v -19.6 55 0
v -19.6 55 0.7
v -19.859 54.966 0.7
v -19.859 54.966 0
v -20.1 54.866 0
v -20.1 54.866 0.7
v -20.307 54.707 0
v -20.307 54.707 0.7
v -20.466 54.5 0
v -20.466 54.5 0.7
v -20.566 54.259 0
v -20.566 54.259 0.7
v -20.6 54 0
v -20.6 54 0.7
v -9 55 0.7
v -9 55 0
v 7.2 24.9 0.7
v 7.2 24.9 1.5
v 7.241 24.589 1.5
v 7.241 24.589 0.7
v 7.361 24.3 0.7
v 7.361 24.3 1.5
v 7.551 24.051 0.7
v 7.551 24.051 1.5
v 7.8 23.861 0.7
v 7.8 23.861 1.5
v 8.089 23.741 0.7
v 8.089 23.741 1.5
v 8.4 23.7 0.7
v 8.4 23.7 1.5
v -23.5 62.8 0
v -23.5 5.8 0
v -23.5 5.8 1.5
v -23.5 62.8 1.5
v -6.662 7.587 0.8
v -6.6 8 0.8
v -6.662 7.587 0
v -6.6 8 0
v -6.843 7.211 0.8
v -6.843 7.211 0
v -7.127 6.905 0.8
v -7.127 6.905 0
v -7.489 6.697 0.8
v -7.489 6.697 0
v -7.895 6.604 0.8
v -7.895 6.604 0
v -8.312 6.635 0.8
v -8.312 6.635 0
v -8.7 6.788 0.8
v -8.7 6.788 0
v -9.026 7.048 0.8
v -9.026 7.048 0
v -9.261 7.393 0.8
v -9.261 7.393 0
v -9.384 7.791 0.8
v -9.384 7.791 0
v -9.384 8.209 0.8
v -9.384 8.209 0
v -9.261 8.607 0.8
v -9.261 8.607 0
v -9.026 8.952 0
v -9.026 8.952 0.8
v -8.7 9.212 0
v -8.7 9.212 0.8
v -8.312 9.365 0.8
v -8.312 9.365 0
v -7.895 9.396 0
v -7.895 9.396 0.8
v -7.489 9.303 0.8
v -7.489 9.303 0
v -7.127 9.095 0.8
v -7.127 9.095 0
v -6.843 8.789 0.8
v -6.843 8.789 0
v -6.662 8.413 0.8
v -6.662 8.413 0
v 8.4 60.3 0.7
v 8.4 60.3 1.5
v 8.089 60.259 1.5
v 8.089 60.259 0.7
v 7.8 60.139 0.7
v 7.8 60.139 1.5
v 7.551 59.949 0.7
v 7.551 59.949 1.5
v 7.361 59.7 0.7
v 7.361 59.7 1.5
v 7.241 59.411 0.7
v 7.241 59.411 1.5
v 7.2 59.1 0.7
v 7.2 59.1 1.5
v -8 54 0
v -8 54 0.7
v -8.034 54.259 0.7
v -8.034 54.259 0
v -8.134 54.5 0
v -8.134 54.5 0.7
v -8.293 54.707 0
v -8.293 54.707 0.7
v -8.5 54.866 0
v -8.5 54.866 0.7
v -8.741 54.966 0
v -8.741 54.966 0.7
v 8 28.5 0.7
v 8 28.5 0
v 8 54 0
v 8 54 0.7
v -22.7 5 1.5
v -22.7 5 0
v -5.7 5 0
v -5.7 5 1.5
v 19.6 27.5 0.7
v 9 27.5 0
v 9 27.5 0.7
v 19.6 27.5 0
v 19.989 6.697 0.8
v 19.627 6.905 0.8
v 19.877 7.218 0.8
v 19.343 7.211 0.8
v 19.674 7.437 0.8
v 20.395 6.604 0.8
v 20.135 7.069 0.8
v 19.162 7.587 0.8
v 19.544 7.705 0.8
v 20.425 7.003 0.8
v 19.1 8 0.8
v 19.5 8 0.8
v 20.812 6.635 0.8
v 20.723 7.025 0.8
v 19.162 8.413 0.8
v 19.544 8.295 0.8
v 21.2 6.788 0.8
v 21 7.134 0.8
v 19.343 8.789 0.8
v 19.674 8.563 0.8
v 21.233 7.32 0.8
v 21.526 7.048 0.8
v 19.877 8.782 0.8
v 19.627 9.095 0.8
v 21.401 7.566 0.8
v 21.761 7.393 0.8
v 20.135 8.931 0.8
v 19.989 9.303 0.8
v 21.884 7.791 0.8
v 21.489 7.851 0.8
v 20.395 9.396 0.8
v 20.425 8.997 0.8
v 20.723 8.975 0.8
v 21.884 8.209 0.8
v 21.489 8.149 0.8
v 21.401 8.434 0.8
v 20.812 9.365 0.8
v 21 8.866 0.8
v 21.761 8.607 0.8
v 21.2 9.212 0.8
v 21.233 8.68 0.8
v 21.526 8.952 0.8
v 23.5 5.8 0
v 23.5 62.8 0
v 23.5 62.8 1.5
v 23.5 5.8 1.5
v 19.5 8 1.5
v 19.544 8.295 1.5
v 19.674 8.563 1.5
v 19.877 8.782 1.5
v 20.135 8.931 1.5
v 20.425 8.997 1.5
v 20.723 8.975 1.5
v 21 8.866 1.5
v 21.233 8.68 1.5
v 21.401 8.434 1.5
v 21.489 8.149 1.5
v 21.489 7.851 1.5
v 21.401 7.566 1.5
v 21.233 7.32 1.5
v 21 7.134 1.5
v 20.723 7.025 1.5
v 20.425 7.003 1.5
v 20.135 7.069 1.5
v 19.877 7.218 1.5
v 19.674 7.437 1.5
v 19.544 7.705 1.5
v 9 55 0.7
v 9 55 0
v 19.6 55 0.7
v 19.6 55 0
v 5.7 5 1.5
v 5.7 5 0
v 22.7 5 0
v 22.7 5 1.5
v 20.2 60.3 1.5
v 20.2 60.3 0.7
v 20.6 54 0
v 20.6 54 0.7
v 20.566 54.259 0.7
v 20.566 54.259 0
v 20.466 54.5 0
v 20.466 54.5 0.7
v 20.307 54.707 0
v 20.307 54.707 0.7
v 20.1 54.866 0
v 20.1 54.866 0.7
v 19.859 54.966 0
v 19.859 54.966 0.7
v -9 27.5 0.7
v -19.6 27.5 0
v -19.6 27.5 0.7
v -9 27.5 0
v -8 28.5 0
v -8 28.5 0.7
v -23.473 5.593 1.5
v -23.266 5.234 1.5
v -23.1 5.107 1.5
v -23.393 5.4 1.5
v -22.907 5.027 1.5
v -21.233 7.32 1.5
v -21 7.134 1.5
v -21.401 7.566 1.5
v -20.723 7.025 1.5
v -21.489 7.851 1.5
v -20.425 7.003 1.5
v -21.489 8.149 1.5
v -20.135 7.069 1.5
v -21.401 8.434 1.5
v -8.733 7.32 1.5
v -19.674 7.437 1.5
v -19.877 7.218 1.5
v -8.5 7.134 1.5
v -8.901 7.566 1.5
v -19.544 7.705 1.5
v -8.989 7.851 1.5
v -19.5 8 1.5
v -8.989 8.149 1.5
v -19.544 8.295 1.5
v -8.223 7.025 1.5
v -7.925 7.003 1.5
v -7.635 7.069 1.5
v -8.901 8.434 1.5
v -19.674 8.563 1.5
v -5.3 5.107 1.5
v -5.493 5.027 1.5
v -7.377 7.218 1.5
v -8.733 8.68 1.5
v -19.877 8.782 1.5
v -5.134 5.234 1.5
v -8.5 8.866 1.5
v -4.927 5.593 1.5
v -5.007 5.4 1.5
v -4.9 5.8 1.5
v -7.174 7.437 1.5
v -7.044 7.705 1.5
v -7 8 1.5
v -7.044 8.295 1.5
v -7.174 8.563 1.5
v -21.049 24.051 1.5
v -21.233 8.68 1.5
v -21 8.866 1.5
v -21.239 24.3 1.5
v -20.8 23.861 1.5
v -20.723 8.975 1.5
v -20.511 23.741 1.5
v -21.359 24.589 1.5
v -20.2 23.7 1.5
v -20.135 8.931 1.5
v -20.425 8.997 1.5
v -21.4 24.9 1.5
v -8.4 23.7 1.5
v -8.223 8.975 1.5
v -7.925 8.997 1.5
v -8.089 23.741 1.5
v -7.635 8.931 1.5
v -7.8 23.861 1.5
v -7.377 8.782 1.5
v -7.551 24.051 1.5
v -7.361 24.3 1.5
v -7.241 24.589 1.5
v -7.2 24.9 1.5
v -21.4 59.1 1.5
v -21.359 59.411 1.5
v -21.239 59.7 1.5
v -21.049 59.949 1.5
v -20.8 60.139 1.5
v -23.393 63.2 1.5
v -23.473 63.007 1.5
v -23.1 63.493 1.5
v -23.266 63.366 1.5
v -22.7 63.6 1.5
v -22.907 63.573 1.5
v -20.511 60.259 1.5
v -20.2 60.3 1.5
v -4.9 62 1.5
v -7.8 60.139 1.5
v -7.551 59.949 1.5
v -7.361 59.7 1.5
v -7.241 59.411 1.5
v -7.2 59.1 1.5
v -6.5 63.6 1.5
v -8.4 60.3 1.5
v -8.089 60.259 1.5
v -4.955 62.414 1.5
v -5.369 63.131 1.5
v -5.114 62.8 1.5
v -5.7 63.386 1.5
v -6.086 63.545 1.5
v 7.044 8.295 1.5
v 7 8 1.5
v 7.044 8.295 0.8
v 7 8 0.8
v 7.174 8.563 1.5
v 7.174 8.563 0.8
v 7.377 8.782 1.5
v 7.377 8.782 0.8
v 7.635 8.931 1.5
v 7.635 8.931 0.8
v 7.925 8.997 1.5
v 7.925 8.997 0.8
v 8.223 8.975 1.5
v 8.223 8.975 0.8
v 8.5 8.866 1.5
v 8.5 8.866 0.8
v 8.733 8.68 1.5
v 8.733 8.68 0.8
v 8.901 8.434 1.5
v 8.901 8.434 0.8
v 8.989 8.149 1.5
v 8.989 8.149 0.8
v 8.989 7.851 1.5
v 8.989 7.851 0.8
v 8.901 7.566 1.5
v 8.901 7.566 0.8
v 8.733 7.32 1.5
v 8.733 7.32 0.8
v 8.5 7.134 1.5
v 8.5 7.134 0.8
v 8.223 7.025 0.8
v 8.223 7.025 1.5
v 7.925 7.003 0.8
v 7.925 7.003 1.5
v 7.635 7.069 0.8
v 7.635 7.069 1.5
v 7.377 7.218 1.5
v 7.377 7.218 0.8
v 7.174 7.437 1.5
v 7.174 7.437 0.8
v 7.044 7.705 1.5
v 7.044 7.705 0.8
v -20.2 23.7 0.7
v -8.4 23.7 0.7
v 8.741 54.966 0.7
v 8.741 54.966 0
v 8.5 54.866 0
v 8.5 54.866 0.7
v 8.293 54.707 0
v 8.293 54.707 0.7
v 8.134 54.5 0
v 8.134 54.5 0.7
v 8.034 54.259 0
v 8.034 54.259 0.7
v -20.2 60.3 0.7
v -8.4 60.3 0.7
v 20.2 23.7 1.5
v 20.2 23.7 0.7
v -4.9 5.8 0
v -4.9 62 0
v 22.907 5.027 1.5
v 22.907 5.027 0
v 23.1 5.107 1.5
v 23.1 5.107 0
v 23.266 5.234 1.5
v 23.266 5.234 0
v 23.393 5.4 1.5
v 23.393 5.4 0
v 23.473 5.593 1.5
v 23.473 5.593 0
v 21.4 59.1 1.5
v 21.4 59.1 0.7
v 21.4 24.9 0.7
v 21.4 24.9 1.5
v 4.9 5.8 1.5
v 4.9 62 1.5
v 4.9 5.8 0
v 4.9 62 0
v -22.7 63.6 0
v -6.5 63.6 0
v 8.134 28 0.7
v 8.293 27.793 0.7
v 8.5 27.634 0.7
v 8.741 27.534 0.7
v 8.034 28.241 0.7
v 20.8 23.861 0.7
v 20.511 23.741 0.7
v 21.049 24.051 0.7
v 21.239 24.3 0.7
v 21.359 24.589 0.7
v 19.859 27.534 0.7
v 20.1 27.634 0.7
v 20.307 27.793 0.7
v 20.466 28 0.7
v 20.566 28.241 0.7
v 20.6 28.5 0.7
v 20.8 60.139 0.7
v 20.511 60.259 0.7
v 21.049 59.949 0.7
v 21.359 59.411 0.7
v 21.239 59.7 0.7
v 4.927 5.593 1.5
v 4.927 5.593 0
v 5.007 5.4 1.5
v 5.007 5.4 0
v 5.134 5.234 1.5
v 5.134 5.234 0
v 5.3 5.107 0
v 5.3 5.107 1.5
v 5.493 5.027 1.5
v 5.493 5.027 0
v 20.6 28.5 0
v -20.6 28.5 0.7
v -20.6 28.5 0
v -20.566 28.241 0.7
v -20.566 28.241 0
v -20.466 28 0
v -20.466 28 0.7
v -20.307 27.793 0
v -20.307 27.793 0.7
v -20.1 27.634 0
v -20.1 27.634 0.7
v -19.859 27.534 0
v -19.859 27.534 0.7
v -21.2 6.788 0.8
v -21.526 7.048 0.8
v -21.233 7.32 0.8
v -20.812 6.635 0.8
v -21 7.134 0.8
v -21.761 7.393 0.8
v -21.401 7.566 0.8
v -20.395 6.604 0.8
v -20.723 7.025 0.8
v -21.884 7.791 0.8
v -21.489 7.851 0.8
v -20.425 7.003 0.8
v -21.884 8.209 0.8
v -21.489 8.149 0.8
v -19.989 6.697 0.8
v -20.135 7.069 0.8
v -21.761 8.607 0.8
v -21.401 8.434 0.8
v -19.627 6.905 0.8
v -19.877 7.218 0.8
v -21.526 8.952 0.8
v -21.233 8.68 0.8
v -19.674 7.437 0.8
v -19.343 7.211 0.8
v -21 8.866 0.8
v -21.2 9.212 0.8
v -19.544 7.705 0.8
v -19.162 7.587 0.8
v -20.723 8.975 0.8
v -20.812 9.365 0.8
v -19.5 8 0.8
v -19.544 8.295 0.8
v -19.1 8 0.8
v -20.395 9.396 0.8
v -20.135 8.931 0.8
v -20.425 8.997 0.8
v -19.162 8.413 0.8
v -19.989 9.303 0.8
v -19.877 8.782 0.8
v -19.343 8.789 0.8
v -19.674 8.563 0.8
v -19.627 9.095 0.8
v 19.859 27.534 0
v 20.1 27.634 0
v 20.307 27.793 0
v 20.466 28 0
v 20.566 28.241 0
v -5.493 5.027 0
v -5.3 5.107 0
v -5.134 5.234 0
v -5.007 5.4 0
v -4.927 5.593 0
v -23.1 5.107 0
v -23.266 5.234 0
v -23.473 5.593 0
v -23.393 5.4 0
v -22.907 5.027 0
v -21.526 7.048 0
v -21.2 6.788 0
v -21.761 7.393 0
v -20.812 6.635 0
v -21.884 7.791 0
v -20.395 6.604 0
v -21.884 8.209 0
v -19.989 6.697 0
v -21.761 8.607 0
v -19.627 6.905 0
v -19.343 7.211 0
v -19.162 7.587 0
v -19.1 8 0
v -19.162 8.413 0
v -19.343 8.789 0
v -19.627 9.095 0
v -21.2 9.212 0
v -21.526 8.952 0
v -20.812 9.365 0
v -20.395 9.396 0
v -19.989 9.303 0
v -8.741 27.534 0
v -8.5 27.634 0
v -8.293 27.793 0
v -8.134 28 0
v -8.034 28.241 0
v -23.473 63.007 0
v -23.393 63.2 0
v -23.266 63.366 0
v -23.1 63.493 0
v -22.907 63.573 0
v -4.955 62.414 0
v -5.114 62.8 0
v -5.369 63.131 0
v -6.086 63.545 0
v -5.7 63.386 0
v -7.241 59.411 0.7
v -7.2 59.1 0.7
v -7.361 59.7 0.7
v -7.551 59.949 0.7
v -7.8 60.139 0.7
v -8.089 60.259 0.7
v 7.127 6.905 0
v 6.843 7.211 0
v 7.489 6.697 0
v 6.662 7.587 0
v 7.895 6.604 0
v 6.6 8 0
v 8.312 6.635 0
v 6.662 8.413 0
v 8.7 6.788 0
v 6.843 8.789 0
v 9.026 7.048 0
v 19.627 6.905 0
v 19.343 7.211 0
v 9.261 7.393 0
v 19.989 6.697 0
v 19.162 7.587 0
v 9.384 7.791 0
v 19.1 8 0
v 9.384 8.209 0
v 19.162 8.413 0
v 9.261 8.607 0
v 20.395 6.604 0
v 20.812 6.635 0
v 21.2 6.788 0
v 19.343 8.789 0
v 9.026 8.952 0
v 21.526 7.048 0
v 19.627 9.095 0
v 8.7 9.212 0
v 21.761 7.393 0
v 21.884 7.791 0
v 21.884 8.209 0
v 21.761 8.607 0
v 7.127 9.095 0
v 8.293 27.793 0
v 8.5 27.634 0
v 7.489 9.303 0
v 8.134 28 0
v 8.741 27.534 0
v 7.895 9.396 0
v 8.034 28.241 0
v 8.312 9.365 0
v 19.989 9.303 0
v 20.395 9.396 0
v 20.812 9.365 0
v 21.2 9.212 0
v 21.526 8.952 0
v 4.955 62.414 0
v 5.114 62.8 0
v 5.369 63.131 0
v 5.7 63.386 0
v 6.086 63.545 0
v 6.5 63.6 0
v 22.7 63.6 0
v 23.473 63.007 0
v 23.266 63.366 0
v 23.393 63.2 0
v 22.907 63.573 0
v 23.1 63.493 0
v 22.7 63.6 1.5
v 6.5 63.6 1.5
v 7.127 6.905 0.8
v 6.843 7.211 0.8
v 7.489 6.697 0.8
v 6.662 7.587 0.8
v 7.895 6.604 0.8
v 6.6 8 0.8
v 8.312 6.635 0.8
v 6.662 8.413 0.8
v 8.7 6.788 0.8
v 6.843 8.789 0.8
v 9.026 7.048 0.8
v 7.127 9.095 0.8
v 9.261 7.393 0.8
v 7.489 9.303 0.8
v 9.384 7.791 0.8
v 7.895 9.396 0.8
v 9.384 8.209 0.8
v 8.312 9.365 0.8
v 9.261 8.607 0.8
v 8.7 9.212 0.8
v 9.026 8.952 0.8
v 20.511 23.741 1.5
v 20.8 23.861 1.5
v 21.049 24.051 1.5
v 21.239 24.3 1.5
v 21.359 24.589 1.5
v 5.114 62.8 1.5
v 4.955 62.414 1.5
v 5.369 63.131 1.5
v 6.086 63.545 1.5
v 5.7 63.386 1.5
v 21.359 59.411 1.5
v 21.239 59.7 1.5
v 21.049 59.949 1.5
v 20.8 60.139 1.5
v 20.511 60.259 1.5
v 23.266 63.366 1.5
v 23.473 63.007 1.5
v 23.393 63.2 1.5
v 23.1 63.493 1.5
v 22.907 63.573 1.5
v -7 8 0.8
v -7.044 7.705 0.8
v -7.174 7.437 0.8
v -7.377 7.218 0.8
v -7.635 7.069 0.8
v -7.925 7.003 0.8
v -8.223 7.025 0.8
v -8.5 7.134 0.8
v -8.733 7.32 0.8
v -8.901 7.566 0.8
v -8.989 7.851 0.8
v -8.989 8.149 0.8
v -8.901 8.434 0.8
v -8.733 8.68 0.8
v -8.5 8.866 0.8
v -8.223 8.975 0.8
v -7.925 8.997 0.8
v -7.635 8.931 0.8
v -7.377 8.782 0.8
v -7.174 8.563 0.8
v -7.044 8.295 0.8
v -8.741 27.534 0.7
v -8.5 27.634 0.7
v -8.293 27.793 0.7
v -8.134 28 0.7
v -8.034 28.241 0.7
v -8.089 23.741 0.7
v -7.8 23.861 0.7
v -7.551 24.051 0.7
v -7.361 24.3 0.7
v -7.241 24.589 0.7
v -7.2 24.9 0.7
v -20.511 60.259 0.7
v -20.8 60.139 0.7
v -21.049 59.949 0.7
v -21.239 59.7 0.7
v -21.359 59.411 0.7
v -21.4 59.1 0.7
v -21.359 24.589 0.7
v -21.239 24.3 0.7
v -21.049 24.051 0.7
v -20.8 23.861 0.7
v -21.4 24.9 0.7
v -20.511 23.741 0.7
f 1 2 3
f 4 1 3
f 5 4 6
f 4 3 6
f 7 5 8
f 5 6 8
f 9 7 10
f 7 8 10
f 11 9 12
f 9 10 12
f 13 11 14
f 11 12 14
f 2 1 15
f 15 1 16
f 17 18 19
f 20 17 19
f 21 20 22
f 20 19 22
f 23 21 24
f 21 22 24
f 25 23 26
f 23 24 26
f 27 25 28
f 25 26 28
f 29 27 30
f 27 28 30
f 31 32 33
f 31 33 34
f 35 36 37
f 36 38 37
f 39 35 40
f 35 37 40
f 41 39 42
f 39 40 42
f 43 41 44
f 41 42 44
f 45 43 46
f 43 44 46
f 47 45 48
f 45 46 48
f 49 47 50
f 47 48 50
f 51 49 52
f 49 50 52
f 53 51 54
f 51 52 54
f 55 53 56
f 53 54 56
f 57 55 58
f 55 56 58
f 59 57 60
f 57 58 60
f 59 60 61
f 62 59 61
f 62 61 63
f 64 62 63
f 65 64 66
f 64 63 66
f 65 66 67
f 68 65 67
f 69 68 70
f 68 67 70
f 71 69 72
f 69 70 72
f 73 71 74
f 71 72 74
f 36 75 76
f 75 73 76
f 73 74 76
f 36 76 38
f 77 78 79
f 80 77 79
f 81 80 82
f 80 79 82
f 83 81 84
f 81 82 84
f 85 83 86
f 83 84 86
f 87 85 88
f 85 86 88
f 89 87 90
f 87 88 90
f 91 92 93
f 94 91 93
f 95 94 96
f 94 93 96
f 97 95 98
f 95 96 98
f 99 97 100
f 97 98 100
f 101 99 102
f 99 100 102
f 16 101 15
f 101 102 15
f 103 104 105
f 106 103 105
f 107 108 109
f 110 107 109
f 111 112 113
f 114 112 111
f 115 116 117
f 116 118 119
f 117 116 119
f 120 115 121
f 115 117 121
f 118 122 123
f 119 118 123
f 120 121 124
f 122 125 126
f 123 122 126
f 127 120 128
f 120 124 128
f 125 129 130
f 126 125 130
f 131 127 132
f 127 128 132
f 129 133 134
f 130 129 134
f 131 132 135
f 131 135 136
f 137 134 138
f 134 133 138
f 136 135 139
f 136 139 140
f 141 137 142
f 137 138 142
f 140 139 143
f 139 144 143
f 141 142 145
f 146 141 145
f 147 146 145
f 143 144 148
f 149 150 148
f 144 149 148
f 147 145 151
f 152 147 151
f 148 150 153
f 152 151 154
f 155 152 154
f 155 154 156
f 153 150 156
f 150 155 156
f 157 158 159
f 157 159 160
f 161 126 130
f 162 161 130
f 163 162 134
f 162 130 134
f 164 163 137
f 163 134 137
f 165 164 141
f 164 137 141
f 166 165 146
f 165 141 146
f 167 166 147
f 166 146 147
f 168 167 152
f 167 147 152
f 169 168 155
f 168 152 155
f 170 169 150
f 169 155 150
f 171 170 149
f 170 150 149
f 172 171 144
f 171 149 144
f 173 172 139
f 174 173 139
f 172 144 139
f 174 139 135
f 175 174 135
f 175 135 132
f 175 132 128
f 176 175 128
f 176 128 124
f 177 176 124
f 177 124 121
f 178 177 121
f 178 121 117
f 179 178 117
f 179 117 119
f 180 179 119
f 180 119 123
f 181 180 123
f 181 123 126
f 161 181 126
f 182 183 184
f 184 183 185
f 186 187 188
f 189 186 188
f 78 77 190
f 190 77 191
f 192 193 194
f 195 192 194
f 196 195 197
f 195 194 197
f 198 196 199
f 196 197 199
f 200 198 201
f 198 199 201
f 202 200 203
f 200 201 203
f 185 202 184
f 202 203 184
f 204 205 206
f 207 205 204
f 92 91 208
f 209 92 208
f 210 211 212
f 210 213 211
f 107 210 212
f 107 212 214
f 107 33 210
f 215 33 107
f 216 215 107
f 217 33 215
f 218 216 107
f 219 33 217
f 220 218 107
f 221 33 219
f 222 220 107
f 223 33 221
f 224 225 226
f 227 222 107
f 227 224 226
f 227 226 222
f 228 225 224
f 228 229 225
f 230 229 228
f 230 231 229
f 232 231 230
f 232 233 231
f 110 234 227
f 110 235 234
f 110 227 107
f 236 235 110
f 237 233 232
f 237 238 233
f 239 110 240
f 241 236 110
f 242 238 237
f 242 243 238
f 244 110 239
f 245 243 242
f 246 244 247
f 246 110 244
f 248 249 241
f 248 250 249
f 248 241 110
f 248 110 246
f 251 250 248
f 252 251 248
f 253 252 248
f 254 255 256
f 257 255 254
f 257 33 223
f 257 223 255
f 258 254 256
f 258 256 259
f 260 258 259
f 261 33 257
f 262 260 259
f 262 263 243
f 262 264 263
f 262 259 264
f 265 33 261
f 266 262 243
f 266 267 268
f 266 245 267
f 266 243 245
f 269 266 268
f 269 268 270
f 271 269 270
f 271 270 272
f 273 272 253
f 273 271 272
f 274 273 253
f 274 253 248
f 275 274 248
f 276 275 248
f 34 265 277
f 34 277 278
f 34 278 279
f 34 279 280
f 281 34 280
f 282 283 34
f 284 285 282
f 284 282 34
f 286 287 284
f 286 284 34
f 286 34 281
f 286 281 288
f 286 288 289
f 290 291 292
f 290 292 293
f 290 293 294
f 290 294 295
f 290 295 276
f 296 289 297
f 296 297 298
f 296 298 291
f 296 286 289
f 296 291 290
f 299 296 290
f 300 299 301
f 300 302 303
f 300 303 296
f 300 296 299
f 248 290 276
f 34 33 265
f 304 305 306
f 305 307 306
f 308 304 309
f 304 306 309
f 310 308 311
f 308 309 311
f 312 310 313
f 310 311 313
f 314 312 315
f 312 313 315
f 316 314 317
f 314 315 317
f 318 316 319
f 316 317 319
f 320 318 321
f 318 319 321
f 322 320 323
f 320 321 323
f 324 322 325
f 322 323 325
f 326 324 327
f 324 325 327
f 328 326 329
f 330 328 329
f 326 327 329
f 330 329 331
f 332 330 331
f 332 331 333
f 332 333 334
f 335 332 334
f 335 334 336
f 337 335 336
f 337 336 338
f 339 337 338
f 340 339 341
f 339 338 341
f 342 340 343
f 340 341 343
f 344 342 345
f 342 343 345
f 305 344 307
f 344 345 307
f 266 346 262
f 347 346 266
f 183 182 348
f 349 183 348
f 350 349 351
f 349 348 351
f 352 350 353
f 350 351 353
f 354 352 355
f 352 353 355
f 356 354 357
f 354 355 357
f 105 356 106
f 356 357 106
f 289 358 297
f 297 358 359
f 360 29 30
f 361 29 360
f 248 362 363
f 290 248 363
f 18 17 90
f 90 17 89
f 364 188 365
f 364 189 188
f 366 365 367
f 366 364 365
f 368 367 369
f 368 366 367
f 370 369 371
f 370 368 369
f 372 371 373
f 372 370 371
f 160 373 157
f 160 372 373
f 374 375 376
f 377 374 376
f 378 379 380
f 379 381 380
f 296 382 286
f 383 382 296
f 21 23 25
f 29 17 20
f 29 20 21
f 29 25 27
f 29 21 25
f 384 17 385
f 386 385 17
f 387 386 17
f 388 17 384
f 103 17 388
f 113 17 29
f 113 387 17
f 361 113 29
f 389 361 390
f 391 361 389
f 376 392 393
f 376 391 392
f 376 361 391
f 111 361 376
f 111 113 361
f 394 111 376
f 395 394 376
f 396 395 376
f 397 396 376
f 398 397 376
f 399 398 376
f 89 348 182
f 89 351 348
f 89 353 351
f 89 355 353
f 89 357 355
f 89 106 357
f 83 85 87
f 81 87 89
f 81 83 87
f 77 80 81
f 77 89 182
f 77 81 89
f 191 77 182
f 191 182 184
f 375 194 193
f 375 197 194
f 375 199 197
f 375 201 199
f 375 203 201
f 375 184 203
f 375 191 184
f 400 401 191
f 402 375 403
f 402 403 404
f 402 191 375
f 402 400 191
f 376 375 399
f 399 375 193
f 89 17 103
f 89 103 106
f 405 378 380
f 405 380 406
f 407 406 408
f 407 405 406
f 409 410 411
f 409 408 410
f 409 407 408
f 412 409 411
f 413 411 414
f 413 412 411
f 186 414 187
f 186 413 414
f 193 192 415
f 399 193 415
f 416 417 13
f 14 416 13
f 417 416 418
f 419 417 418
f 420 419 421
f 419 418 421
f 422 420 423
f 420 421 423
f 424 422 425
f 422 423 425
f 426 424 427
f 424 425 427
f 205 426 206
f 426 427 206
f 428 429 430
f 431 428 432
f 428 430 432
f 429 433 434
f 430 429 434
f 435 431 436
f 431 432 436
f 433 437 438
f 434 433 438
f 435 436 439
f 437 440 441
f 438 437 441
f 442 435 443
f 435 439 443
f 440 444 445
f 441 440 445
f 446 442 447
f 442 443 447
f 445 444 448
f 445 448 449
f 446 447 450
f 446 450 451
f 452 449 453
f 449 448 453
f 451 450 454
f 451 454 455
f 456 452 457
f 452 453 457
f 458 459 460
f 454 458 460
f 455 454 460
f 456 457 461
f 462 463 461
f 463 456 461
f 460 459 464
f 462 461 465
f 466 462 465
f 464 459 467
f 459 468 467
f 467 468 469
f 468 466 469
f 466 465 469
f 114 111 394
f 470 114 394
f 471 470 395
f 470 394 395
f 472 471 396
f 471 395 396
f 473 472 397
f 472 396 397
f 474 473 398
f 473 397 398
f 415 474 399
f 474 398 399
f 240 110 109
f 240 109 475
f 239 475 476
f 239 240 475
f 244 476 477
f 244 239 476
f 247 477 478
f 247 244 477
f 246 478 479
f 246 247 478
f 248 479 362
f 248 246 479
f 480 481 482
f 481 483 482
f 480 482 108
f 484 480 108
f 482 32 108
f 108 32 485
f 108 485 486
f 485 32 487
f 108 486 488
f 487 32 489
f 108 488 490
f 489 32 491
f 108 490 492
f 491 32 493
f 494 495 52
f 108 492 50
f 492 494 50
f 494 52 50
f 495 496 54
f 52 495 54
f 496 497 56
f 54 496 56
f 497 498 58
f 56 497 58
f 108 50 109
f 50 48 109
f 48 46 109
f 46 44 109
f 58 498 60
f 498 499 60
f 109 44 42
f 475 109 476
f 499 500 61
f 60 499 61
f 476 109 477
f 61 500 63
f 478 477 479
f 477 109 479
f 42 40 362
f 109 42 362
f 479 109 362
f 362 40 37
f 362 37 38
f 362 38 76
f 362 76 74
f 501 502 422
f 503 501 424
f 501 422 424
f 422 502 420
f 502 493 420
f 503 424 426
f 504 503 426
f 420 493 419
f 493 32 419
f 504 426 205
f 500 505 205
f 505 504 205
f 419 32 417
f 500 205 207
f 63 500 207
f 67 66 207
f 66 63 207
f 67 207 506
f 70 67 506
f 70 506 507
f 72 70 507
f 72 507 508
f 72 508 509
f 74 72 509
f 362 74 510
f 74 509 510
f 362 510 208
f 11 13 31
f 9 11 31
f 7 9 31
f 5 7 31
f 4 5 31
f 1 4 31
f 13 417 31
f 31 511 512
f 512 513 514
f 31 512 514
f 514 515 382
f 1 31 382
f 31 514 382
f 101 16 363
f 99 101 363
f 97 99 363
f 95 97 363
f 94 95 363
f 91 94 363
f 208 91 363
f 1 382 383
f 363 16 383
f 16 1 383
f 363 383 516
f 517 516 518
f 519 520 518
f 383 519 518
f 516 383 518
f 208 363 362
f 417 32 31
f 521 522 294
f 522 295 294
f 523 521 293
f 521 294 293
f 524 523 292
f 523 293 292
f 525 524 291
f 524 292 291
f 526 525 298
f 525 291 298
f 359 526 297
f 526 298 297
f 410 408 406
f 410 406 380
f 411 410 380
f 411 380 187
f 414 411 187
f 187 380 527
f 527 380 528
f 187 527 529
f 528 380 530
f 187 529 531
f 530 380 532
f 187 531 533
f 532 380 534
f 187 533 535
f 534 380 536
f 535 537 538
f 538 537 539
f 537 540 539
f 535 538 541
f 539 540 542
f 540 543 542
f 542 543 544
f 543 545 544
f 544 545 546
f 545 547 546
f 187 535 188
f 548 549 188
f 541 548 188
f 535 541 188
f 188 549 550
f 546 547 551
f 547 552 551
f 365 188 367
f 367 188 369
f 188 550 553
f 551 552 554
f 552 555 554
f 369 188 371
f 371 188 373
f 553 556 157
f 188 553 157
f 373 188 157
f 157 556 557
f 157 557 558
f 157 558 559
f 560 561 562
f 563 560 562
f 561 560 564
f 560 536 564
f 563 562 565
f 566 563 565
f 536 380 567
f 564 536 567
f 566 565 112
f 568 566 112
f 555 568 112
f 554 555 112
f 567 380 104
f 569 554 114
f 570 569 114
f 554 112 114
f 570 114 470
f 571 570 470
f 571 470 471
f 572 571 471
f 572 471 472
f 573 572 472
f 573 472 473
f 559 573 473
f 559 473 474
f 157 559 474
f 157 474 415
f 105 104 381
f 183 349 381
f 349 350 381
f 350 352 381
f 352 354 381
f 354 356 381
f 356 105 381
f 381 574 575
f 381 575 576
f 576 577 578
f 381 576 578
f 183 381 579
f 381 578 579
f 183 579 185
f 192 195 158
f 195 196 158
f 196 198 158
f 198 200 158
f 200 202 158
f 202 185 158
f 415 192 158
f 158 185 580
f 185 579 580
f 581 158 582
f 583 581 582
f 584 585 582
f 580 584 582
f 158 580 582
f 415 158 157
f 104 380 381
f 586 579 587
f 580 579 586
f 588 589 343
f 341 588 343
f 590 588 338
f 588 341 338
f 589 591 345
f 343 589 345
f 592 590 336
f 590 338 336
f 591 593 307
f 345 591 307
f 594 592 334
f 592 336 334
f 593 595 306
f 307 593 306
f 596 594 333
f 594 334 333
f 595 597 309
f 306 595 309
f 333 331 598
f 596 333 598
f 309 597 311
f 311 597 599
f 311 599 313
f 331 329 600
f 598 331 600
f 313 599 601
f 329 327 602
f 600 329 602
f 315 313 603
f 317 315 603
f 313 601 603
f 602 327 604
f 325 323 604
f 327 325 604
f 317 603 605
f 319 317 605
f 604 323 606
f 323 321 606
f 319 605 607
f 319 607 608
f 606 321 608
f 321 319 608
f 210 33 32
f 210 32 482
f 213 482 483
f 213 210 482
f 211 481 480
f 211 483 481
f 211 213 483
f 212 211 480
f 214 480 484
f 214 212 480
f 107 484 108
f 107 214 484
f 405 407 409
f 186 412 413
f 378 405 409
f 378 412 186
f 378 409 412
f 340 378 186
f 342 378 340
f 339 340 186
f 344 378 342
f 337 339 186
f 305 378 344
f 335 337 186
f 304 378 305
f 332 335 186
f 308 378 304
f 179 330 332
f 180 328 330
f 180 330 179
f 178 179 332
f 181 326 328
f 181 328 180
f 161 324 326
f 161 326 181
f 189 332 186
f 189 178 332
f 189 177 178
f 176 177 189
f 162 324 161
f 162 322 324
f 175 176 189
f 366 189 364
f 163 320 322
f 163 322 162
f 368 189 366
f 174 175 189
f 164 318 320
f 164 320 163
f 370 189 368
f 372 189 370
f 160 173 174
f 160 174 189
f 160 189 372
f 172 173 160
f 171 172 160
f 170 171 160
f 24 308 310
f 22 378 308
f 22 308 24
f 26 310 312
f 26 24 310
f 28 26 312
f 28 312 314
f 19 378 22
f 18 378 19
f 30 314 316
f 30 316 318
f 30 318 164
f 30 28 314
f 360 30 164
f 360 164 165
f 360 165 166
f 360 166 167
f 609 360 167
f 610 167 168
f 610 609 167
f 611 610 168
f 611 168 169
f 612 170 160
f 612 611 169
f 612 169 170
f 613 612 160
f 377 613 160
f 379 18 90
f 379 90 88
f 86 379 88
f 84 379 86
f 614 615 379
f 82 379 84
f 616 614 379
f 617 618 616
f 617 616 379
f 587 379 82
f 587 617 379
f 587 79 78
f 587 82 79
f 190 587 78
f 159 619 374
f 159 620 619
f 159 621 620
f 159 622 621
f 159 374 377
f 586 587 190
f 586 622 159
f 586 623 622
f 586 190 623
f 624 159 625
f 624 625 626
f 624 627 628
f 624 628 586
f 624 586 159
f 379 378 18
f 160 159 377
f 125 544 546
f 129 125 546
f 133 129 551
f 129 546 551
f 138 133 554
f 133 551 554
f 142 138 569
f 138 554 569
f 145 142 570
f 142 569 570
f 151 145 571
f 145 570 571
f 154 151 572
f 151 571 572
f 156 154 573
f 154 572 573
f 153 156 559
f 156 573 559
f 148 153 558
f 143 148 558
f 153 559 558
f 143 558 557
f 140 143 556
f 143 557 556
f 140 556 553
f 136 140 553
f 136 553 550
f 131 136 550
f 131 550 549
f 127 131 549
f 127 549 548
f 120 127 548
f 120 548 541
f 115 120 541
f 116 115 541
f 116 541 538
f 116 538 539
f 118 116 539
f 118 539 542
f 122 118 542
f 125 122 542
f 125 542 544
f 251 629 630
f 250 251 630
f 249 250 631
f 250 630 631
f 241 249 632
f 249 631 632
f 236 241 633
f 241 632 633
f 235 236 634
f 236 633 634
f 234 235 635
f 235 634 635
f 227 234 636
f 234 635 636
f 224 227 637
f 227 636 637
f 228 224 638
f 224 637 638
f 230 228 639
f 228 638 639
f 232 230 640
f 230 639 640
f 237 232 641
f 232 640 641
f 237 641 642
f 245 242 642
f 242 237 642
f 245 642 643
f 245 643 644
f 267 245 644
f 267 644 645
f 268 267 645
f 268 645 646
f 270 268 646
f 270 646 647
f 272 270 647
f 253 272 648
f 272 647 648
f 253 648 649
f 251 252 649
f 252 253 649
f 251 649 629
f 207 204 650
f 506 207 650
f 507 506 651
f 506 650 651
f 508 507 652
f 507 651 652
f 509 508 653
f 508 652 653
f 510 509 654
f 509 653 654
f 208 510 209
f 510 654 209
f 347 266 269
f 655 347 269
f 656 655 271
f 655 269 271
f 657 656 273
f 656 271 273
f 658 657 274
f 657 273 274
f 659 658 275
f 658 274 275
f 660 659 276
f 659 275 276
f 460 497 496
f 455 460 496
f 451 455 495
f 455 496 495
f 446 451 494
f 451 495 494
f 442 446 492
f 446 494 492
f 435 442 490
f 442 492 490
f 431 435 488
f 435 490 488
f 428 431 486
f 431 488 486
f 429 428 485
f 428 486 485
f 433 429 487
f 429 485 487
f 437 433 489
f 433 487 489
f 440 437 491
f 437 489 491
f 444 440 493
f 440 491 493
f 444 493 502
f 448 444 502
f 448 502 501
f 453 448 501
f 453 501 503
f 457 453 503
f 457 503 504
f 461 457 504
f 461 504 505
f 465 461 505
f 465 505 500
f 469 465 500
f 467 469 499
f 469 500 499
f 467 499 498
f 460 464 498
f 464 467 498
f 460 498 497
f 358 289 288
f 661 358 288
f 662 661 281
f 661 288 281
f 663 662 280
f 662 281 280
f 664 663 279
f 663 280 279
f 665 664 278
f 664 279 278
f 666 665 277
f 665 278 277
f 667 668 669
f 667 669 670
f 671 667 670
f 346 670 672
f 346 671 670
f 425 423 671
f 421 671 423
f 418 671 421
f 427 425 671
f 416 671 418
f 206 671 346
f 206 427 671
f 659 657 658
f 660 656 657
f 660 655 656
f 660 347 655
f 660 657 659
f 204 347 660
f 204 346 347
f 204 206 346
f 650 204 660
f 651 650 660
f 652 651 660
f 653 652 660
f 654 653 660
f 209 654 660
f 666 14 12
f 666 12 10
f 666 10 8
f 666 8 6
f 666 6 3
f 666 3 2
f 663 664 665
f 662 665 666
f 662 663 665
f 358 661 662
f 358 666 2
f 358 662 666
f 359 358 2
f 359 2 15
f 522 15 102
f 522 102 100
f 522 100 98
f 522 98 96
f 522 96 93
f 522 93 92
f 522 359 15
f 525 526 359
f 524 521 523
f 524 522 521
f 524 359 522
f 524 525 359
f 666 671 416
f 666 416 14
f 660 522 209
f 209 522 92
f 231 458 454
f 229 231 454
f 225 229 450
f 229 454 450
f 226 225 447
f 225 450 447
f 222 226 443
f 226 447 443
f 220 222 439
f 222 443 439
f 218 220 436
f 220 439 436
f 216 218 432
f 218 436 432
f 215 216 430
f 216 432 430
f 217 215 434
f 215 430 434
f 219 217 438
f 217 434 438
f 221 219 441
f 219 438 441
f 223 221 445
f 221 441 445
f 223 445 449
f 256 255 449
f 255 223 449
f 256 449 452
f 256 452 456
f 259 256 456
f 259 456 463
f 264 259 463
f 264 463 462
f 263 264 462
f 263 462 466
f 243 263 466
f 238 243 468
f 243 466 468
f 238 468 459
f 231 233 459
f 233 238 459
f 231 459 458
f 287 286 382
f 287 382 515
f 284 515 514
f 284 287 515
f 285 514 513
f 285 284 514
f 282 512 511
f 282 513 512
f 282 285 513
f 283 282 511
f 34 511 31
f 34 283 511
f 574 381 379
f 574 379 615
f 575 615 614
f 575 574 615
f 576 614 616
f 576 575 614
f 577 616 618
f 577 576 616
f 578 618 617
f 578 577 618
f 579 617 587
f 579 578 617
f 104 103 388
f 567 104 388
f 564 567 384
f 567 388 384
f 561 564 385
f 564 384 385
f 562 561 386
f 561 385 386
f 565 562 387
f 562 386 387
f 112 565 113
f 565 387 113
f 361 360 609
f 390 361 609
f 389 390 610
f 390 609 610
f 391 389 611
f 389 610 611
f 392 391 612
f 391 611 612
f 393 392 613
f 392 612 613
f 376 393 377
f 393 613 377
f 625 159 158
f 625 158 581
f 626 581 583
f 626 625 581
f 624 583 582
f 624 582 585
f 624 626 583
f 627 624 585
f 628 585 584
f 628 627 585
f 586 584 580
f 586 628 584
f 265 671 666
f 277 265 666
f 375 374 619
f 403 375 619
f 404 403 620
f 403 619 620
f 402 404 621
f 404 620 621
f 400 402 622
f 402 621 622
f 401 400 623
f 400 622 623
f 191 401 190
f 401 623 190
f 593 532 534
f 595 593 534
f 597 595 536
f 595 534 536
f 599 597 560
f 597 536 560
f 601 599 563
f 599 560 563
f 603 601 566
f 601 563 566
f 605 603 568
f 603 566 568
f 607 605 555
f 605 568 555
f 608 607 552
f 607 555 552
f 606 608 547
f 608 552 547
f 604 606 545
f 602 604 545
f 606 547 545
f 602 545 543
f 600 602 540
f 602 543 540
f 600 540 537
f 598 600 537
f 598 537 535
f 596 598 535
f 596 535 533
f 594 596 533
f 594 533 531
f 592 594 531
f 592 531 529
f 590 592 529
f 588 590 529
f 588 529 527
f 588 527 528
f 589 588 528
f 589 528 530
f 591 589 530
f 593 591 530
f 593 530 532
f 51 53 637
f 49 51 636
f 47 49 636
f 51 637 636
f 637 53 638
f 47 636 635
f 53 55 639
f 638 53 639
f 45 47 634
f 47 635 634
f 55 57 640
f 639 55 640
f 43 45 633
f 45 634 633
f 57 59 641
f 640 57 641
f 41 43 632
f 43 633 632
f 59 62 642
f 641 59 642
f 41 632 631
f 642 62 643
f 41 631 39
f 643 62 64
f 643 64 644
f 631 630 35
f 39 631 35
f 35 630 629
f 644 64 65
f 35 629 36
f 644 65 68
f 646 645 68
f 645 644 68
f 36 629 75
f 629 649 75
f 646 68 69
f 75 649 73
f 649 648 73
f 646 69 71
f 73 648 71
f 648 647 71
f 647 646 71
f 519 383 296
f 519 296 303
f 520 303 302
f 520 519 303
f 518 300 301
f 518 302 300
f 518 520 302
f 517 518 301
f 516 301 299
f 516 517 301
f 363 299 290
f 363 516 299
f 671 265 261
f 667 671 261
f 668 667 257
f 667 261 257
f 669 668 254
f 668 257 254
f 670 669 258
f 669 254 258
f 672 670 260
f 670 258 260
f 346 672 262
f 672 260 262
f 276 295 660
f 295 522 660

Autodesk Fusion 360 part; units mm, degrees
sketch "mriya-display-cover" plane through (0, 0, 0) normal (0, 0, 1) x (1, 0, 0)
  line L0 (-21.4, 23.7) -> (-21.4, 60.3)
  line L1 (-22.7, 5) -> (-5.8, 5) construction
  line L2 (-5, 5.8) -> (-5, 62) construction
  arc A0 (-5.8, 5) -> (-5, 5.8) centre (-5.8, 5.8) ccw construction
  arc A1 (-23.5, 5.8) -> (-22.7, 5) centre (-22.7, 5.8) ccw construction
  line L3 (-4.9, 5) -> (-4.9, 62)
  line L4 (-7.2, 60.3) -> (-7.2, 23.7)
  line L5 (-23.5, 5.8) -> (-23.5, 62.7) construction
  line L6 (-23.5, 63.6) -> (-6.5, 63.6)
  arc A2 (-10, 62.8) -> (-9.3, 63.5) centre (-10, 63.5) ccw construction
  line L7 (-20.6, 27.5) -> (-20.6, 55)
  line L8 (-8, 55) -> (-8, 27.5)
  arc A3 (-19.3, 63.5) -> (-18.6, 62.8) centre (-18.6, 63.5) ccw construction
  line L9 (-20.6, 55) -> (-8, 55)
  line L10 (-18.6, 62.8) -> (-10, 62.8) construction
  arc A4 (-22.7, 63.5) -> (-23.5, 62.7) centre (-22.7, 62.7) ccw construction
  line L11 (-22.7, 63.5) -> (-6.5, 63.5) construction
  line L12 (-21.4, 60.3) -> (-7.2, 60.3)
  line L13 (-20.6, 27.5) -> (-8, 27.5)
  line L14 (-23.5, 5) -> (-4.9, 5)
  circle A5 centre (-8, 8) radius 1.4
  circle A6 centre (-8, 20.7) radius 1 construction
  circle A7 centre (-20.5, 8) radius 1.4
  line L15 (-23.5, 5) -> (-23.5, 63.6)
  arc A8 (-5, 62) -> (-6.5, 63.5) centre (-6.5, 62) ccw construction
  arc A9 (-4.9, 62) -> (-6.5, 63.6) centre (-6.5, 62) ccw
  circle A10 centre (-20.5, 8) radius 1
  circle A11 centre (-8, 8) radius 1
  line L16 (-21.4, 23.7) -> (-7.2, 23.7)
  line L17 (-5, 23.7) -> (-4.9, 23.7)
  dimension "d601" = 2.8
  dimension "d602" = 2.8
  dimension "d606" = 2
  dimension "d609" = 2
  dimension "d610" = 2
extrude "Extrude78" add sketch "mriya-display-cover" along normal blind 1.5 contours L3 L6 L14 L15 A9 makes body 1
extrude "Extrude79" add sketch "mriya-display-cover" along normal blind 0.7 contours L0 L4 L12 L16 bodies 1
extrude "Extrude80" add sketch "mriya-display-cover" along normal blind 0.7 from surface at 0.8 contours A5 | A7 bodies 1
fillet "Fillet57" radius 0.8 3 edges at (-4.9, 5, 0.75) (-23.5, 5, 0.75) (-23.5, 63.6, 0.75) on bodies 1
fillet "Fillet58" radius 1 4 edges at (-20.6, 27.5, 0.35) (-8, 27.5, 0.35) (-20.6, 55, 0.35) (-8, 55, 0.35) on bodies 1
fillet "Fillet59" radius 1.2 4 edges at (-7.2, 23.7, 1.1) (-21.4, 23.7, 1.1) (-21.4, 60.3, 1.1) (-7.2, 60.3, 1.1) on bodies 1
mirror "Mirror10" about plane through (0, 0, 0) normal (1, 0, 0) of bodies 1 makes body 2
